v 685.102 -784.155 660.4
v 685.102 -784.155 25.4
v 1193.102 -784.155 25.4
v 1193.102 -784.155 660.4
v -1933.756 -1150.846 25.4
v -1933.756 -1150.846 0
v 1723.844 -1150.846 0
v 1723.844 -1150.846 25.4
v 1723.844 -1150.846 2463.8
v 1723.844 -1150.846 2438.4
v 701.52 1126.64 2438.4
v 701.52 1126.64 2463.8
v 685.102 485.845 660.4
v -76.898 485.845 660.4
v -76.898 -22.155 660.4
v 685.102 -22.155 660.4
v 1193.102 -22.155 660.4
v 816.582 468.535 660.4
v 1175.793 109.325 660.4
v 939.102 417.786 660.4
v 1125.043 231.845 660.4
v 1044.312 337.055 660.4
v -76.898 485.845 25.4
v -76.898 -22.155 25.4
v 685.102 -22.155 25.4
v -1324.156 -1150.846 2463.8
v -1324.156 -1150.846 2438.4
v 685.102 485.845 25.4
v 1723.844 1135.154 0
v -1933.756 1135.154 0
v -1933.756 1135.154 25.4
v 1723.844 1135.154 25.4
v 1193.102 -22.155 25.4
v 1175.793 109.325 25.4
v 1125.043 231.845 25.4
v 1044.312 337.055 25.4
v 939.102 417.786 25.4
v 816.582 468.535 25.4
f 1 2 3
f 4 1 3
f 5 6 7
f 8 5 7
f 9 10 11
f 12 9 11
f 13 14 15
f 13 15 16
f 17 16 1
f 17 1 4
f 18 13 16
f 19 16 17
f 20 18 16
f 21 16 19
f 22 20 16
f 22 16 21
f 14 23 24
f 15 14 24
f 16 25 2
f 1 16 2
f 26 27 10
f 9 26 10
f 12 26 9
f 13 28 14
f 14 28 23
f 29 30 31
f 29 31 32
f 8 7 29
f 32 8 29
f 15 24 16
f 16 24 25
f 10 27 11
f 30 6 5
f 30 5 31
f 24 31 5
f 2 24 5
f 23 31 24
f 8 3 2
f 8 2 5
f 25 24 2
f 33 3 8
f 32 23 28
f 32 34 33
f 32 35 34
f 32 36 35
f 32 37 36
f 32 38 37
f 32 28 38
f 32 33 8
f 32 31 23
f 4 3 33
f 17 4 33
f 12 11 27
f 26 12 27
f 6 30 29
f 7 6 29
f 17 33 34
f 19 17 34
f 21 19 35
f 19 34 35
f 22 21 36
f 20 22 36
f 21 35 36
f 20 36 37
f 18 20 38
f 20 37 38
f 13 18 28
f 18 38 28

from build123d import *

# Parameters (mm, degrees)
F0_W     = 3657.6
F0_H     = 2286
F1_DEPTH = 25.4
F4_DEPTH = 635
F7_DEPTH = 25.4


with BuildPart() as f1:
    # F0 (on Top) → F1 (new body)
    with BuildSketch(Plane.XY):
        with Locations((-104.956031, -7.845942)):
            Rectangle(F0_W, F0_H)
    extrude(amount=F1_DEPTH)

    # F2 (on face) → F4 (join)
    with BuildSketch(Plane.XY.offset(25.4)):
        with BuildLine():
            Line((1193.10219, -784.155136), (1193.10219, -22.155136))
            ThreePointArc((1193.10219, -22.155136), (1044.312435, 337.055109), (685.10219, 485.844864))
            Line((685.10219, 485.844864), (-76.89781, 485.844864))
            Line((-76.89781, 485.844864), (-76.89781, -22.155136))
            Line((-76.89781, -22.155136), (685.10219, -22.155136))
            Line((685.10219, -22.155136), (685.10219, -784.155136))
            Line((685.10219, -784.155136), (1193.10219, -784.155136))
        make_face()
    extrude(amount=F4_DEPTH)


with BuildPart() as f7:
    # F6 (on offset) → F7 (new body)
    with BuildSketch(Plane.XY.offset(2438.4)):
        Polygon((-1324.156031, -1150.845942), (1723.843969, -1150.845942), (701.519705, 1126.639911), align=None)
    extrude(amount=F7_DEPTH)


solid = Compound([f1.part, f7.part])
